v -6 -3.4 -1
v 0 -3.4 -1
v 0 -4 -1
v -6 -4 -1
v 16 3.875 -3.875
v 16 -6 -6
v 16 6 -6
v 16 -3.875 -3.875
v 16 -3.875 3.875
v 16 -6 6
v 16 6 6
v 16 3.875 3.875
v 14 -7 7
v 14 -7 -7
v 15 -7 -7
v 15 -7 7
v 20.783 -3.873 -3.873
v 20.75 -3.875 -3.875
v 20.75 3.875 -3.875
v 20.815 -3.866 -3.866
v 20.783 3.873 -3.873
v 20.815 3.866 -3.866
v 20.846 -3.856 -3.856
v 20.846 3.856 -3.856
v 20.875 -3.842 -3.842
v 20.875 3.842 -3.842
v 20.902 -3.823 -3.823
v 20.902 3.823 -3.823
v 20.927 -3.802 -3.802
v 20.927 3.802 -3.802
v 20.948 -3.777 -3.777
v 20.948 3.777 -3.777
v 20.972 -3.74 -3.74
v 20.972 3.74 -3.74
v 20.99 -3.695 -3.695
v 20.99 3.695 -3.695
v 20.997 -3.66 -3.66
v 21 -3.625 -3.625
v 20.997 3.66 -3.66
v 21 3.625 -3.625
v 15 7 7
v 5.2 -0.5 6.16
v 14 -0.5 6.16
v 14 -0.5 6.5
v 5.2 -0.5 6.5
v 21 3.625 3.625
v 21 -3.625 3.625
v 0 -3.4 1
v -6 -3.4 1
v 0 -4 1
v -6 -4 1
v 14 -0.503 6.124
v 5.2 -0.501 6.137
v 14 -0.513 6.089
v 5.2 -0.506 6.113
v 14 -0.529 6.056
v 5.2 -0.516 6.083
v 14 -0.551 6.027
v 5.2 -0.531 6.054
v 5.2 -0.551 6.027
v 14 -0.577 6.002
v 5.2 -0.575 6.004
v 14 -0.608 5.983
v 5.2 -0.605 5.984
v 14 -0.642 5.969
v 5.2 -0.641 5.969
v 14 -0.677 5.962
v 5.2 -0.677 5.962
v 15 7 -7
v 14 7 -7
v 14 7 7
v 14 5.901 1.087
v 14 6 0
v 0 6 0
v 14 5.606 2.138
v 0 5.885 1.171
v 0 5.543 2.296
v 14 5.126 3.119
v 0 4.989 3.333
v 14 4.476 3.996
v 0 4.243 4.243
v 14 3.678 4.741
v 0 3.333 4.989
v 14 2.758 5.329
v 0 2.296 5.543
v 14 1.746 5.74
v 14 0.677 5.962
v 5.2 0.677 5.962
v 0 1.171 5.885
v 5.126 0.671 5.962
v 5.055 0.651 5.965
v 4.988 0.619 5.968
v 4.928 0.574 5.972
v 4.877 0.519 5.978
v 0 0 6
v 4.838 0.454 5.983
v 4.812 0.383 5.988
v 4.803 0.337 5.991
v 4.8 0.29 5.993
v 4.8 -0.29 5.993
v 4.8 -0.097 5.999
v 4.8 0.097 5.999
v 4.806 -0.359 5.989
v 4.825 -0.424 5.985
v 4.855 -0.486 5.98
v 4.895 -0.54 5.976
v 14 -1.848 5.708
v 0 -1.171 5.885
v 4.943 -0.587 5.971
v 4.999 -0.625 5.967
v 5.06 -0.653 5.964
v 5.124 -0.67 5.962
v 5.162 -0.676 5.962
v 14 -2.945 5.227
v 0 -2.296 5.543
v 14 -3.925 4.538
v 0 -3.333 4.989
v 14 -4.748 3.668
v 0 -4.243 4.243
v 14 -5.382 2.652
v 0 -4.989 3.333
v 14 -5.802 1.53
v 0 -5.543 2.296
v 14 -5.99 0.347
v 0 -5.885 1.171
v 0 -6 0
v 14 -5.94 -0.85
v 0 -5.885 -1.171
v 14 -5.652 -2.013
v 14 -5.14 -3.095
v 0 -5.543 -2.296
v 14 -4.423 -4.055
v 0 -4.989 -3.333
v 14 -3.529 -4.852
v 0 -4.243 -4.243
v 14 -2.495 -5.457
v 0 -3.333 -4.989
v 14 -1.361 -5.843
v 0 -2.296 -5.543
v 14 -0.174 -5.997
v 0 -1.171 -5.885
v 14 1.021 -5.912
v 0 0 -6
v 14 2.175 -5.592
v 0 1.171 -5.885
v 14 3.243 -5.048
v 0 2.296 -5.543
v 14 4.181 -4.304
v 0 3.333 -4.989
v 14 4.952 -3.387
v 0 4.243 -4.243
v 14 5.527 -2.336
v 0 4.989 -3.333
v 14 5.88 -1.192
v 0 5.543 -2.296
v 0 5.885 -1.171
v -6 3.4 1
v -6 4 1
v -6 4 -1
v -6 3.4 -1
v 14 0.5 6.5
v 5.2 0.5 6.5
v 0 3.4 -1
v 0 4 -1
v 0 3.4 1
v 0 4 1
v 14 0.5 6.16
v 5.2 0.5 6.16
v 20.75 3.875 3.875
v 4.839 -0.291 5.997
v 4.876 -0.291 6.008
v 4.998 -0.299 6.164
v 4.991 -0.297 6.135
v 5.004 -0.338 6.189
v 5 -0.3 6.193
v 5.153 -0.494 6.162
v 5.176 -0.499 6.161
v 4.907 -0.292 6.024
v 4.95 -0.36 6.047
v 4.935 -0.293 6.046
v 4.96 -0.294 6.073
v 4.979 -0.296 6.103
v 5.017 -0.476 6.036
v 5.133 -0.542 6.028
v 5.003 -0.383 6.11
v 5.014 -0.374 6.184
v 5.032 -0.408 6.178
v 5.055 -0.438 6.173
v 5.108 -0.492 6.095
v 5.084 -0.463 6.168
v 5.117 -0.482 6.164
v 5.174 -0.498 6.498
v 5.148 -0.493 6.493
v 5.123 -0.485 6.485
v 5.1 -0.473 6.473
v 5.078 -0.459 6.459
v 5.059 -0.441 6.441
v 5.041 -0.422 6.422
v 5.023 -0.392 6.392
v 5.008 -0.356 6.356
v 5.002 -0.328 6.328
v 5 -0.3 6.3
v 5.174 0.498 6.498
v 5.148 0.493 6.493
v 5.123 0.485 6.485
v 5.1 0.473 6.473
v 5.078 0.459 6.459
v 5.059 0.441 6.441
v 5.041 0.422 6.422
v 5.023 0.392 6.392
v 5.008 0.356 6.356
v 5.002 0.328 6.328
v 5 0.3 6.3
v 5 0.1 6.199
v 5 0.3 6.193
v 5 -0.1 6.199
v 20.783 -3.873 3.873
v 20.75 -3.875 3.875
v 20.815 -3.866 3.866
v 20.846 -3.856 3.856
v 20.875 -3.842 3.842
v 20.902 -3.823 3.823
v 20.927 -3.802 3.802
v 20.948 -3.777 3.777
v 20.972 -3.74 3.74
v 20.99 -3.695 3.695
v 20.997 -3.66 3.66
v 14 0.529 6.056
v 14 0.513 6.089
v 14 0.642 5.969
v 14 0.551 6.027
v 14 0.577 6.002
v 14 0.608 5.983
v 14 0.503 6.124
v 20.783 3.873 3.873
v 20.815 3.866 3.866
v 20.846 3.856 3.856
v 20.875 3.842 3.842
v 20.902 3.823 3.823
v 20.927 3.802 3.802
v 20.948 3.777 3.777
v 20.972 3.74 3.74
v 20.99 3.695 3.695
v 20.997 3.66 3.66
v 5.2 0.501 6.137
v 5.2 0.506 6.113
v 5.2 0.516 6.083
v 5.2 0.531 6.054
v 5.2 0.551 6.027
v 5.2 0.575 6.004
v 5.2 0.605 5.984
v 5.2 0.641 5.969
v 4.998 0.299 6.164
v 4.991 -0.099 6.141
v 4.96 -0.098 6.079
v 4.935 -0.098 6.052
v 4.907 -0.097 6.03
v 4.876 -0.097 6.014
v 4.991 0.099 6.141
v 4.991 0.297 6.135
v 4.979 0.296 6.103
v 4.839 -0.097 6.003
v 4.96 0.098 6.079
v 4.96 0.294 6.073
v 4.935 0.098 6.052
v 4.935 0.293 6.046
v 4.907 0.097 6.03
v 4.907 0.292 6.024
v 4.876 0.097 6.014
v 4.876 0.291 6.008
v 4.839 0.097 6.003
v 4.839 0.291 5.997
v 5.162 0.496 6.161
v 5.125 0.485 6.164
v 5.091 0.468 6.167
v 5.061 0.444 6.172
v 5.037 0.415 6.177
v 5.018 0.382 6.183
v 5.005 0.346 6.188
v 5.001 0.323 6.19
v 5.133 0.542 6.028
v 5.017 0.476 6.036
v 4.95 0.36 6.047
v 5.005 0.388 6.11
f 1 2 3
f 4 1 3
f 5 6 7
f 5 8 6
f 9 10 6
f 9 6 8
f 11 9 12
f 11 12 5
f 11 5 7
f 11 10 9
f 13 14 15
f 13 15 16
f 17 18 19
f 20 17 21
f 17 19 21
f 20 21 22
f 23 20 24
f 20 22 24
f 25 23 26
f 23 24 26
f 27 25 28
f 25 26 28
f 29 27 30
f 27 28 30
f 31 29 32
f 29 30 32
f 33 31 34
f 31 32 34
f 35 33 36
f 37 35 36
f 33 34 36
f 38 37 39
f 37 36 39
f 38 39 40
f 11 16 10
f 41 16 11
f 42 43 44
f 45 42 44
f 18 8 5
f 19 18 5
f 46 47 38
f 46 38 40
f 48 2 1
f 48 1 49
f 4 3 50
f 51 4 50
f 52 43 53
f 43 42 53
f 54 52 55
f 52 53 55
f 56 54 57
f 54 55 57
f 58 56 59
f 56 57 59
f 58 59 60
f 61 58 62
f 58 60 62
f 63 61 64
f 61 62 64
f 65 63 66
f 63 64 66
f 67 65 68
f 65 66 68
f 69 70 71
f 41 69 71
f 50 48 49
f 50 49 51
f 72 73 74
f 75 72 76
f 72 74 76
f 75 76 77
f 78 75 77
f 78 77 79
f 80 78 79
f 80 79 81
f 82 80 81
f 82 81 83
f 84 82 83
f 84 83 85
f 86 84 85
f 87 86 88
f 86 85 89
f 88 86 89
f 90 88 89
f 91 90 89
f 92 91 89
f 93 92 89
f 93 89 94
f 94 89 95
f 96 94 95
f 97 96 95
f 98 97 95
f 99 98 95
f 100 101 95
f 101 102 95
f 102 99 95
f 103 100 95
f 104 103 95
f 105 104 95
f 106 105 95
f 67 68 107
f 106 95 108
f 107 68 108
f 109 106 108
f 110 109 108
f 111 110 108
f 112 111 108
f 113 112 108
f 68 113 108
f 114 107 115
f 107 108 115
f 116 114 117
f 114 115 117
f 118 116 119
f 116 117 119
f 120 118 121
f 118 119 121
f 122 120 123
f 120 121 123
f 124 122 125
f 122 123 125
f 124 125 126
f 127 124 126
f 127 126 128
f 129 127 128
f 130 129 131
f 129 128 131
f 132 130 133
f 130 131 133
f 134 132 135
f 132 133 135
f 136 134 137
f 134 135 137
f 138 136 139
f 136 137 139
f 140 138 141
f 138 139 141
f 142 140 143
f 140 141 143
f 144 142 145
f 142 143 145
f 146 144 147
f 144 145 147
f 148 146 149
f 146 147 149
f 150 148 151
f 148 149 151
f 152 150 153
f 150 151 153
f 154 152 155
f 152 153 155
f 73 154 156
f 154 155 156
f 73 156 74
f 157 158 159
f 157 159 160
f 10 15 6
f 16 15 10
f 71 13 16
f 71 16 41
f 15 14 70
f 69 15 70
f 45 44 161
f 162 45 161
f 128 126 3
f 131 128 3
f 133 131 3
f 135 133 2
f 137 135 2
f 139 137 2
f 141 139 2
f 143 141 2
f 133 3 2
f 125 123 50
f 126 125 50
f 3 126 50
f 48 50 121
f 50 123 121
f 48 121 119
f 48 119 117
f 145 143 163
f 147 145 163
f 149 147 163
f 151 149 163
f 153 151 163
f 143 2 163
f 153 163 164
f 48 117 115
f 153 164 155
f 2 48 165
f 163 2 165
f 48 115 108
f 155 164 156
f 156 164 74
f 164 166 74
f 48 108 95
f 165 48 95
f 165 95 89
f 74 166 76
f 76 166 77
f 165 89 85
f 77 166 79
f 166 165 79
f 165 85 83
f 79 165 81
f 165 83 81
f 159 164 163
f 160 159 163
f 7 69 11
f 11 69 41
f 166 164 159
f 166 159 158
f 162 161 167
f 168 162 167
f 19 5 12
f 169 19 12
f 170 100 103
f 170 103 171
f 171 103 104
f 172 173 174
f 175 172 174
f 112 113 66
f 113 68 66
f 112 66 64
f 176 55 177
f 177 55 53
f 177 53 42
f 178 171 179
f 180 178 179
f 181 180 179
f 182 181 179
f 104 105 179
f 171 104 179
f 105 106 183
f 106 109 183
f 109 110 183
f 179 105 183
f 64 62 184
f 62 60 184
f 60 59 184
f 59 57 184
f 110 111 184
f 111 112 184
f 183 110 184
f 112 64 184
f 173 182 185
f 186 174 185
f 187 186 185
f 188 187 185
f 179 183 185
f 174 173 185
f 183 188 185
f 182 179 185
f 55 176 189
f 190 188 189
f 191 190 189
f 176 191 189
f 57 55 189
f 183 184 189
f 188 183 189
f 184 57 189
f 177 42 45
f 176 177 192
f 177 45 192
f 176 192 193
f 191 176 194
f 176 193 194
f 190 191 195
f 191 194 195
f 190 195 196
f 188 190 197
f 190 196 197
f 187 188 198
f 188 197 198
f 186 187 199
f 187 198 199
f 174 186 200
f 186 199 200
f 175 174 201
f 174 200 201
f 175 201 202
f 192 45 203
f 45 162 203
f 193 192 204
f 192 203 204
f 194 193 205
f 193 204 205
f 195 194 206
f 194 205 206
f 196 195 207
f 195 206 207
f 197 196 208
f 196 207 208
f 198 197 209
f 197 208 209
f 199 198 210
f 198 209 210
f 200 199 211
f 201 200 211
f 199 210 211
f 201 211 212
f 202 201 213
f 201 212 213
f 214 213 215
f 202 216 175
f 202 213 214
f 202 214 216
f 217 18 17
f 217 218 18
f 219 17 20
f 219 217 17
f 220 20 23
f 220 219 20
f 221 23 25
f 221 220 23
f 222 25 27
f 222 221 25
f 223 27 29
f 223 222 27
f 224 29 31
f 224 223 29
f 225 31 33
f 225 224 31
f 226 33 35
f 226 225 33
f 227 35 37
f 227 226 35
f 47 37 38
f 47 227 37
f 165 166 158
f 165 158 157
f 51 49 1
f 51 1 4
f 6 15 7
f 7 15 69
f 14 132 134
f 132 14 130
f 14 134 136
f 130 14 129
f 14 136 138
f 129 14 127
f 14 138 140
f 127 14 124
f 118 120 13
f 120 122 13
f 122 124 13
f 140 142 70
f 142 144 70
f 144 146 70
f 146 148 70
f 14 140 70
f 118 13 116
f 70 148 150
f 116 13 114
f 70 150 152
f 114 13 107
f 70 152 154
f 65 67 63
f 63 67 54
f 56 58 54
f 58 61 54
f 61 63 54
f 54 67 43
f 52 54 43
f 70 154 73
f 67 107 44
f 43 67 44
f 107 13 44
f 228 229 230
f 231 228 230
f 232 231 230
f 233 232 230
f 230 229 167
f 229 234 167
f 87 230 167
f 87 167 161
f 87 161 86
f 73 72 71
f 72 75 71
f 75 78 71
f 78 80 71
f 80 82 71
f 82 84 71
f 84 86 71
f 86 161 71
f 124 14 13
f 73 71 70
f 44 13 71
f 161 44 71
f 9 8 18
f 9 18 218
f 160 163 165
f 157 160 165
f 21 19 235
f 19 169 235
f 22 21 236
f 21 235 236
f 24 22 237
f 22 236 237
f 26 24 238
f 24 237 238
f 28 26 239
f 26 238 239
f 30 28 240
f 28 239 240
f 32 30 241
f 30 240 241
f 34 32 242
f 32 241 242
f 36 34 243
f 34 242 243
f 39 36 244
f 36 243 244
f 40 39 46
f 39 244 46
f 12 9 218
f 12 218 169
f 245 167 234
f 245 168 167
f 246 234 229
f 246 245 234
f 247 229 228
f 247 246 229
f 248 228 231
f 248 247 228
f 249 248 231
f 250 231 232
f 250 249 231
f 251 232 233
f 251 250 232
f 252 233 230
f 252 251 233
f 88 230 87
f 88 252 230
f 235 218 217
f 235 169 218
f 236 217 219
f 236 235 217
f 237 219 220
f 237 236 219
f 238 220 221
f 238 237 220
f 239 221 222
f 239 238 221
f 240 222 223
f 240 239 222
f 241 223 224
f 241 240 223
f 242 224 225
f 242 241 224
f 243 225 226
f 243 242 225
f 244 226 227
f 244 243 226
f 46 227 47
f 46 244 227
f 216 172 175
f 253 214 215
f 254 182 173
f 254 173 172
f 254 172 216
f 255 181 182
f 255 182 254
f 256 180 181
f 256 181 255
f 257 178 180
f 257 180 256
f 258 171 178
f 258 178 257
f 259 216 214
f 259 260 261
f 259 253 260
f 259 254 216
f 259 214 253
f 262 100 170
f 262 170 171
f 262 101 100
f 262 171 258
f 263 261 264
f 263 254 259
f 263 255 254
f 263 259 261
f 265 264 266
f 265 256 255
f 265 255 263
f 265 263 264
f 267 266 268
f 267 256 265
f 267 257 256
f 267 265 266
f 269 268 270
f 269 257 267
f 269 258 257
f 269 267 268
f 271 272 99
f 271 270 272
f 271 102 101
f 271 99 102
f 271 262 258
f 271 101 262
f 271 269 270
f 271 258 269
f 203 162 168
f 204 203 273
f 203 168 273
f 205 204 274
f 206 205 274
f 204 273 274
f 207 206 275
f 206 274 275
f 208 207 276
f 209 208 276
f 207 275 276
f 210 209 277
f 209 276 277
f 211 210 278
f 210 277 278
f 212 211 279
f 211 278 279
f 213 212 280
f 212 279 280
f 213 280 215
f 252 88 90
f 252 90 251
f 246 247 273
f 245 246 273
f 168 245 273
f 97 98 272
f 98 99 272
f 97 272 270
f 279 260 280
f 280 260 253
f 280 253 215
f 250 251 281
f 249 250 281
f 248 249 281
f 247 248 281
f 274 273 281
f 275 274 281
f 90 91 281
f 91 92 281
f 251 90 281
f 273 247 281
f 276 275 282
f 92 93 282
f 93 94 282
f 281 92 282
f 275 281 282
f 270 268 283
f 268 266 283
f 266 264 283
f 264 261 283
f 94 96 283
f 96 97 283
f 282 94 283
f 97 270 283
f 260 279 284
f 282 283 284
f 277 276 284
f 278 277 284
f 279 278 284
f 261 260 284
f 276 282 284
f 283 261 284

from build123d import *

# Parameters (mm, degrees)
F0_R      = 6
F1_DEPTH  = 14
F2_W      = 14
F2_H      = 14
F3_DEPTH  = 2
F4_W      = 7.75
F4_H      = 7.75
F5_DEPTH  = 5
F6_W      = 0.6
F6_H      = 2
F7_DEPTH  = 6
F8_R      = 0.25
F9_SIZE   = 1
F11_DEPTH = 9
F12_R     = 0.2


with BuildPart() as f1:
    # F0 (on Right) → F1 (new body)
    with BuildSketch(Plane.YZ):
        Circle(F0_R)
    extrude(amount=F1_DEPTH)

    # F2 (on face) → F3 (join)
    with BuildSketch(Plane.YZ.offset(14)):
        Rectangle(F2_W, F2_H)
    extrude(amount=F3_DEPTH)

    # F4 (on face) → F5 (join)
    with BuildSketch(Plane.YZ.offset(16)):
        Rectangle(F4_W, F4_H)
    extrude(amount=F5_DEPTH)

    # F6 (on face) → F7 (join)
    with BuildSketch(Plane(origin=(0, 0, 0), x_dir=(0, -1, 0), z_dir=(-1, 0, 0))):
        with Locations((-3.7, 0)):
            Rectangle(F6_W, F6_H)
        with Locations((3.7, 0)):
            Rectangle(F6_W, F6_H)
    extrude(amount=F7_DEPTH)

    # F8
    f8_edges = [f1.edges().sort_by_distance(p)[0] for p in [
        (21, 0, 3.875),
        (21, -3.875, 0),
        (21, 0, -3.875),
        (21, 3.875, 0),
    ]]
    fillet(f8_edges, radius=F8_R)

    # F9
    f9_edges = [f1.edges().sort_by_distance(p)[0] for p in [
        (16, 0, -7),
        (16, -7, 0),
        (16, 0, 7),
        (16, 7, 0),
    ]]
    chamfer(f9_edges, length=F9_SIZE)

    # F10 (on face) → F11 (join)
    with BuildSketch(Plane(origin=(14, 0, 0), x_dir=(0, -1, 0), z_dir=(-1, 0, 0))):
        Polygon((0.5, 6.5), (-0.5, 6.5), (-0.5, 6), (-0.5, 5.9002675116), (0.5, 5.9002675116), (0.5, 6), align=None)
    extrude(amount=F11_DEPTH)

    # F12
    f12_edges = [f1.edges().sort_by_distance(p)[0] for p in [
        (5, -0.5, 6.239565),
        (5, 0, 6),
        (5, 0.5, 6.239565),
        (5, 0, 6.5),
        (9.5, -0.5, 5.97913),
        (9.5, 0.5, 5.97913),
    ]]
    fillet(f12_edges, radius=F12_R)


solid = f1.part
